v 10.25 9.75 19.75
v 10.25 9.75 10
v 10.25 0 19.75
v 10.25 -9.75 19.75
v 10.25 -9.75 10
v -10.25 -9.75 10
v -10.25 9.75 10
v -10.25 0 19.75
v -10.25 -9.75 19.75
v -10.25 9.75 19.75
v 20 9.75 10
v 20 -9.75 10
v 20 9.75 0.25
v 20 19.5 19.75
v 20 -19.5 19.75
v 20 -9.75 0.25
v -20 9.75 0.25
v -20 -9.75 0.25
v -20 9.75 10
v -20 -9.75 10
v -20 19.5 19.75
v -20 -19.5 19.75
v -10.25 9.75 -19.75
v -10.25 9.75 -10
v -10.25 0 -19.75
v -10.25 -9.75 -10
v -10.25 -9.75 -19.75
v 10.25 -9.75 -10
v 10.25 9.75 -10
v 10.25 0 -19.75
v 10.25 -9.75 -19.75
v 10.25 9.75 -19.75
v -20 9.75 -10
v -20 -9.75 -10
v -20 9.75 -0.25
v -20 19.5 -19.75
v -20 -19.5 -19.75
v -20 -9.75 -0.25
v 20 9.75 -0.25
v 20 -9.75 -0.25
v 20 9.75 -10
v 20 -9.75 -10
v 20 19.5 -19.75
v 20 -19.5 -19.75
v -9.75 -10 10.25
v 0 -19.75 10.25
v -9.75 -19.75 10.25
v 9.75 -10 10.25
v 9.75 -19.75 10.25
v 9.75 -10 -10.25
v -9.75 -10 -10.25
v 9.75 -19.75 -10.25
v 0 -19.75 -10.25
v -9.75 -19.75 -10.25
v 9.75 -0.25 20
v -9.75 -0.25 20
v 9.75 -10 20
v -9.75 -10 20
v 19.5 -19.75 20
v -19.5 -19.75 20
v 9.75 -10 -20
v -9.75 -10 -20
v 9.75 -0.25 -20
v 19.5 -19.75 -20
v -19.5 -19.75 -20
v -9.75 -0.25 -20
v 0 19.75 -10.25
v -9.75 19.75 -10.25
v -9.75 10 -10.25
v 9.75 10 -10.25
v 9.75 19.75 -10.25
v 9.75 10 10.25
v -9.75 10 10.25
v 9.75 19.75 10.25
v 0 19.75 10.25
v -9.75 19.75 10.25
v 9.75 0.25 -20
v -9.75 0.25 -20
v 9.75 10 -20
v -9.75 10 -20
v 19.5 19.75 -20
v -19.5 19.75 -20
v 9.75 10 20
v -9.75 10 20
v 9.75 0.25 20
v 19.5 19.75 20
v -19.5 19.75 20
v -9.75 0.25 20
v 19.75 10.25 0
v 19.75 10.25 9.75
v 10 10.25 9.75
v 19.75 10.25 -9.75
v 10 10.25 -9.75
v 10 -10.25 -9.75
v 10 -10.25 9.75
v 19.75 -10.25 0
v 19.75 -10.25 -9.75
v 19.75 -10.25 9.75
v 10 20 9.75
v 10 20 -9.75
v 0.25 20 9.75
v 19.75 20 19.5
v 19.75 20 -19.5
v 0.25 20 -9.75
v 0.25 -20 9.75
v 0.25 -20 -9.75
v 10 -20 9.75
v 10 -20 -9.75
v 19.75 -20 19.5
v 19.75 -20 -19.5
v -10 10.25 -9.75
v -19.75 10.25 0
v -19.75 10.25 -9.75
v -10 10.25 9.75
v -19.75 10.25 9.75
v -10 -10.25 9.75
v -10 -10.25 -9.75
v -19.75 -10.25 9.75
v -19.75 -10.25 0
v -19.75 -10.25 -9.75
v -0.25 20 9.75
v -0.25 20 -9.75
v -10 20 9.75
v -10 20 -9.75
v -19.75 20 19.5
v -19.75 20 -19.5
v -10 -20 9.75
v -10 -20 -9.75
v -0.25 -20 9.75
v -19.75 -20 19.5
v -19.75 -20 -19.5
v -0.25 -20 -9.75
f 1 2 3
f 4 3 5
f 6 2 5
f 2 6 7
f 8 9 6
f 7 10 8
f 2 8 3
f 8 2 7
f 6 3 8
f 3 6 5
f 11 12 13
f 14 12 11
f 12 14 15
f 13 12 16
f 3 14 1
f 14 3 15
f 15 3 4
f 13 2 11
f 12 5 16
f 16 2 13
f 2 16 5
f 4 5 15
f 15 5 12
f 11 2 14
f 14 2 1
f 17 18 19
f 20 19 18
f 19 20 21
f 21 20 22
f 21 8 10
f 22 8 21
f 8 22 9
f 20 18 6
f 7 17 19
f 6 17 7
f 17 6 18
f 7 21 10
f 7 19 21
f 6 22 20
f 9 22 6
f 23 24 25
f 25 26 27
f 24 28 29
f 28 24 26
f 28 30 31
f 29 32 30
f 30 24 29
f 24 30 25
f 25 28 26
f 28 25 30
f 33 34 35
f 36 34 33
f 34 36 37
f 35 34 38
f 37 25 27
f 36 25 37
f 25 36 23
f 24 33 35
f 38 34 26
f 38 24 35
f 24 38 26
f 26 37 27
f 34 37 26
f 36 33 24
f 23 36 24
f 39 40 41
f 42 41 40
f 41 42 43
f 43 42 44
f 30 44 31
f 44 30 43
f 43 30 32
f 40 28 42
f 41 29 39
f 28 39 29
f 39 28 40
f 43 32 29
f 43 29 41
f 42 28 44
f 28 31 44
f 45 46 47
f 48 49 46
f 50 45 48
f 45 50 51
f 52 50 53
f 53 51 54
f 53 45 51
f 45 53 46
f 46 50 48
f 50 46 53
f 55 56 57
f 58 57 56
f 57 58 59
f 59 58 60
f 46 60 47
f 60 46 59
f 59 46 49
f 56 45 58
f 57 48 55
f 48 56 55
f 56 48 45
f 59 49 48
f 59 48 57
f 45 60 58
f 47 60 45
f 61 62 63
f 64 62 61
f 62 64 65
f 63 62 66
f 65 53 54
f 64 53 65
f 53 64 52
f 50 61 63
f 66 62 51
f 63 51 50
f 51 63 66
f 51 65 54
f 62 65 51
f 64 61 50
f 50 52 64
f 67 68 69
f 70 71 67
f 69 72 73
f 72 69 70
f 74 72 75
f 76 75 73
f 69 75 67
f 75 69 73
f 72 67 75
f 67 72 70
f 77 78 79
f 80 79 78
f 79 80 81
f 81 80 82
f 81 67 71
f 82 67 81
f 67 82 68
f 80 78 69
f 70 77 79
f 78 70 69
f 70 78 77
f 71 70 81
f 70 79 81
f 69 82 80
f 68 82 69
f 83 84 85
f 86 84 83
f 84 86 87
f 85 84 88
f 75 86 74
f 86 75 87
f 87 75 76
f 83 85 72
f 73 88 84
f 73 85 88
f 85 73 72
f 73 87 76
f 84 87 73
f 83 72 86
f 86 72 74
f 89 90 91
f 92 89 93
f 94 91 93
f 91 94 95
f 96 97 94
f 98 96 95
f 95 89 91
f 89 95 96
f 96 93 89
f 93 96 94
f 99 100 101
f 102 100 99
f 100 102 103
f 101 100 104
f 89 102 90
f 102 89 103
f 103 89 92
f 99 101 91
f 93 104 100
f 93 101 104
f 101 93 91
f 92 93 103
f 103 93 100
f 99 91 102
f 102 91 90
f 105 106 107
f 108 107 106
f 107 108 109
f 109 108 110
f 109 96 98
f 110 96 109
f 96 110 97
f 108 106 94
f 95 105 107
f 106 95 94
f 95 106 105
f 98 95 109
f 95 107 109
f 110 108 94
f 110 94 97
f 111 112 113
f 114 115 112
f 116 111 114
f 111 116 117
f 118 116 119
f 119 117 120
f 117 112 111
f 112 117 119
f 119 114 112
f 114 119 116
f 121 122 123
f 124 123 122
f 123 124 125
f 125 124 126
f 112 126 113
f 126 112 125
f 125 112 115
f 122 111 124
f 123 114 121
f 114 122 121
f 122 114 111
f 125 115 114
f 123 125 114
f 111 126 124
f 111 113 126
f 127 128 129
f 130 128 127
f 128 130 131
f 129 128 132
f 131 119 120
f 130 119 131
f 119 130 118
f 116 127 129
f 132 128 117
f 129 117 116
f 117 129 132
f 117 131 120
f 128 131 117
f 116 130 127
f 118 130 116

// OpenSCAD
/////////////////////////////////////////////
// Expanding Box puzzle
// --------------------
//
// This is a coordinate motion puzzle with 6 identical pieces.
// The original idea is from Steward Coffin: https://johnrausch.com/PuzzlingWorld/chap12.htm#p1
// In his words: "it is more of an amusement than a puzzle".
//
//
// Very easy to print (no support, 0.2mm, a = 40 and g = 0.25 works nicely for me).
//
// Designed by David Gontier ( davidgontier@gmail.com )
// 
/////////////////////////////////////////////


a = 40;
g = 0.25; // the gap

//////////////////////////////////////////////
R = a/4;

module prism() { 
    difference() {
        translate([-R-g, -R, 0]) cube([2*R+2*g, 2*R, R]); // main cube
        translate([-R-1, R, -g]) rotate([45, 0, 0]) cube(R*[4,4,4]) ; //first cut
        translate([-R-1, -R, -g]) rotate([45, 0, 0]) cube(R*[4,4,4]) ; //second cut
        
    }
}

module tip() { 
    intersection() {
        cube((R-g)*[1,1,1]);
        rotate([0, 45, 0]) cube(R*[2, 2, 2]);
        rotate([-45,0, 0]) cube(R*[2, 2, 2]);
    }
}

module rhomboid_prism() {
    union() {
        // the main prism
        intersection() {
            translate([0, -R+g, -R]) cube([R-g, 2*R-2*g, 2*R-g]);
            rotate([0, 45, 0]) translate([-2*R, -R, 0]) cube(R*[4, 4, 4]);
        }
        // the tips
        translate([0, -R+g, 0]) rotate([90, 0, 0] ) tip();
        translate([0, R-g, 0]) rotate([0, -90, 0] ) rotate([-90, 0, 0] ) tip();
    }
        
}

module piece() { render() 
    union() {
        prism();
        translate([R+g, 0, 0]) rhomboid_prism();
        rotate([0, 0, 180]) translate([R+g, 0, 0]) rhomboid_prism();
    }
}

// For the STL file
//! translate([0, 0, R]) rotate([180, 0, 0]) piece();


// For the animation
//x = $t;
x = 0;
translate(R*[0, 0, 1+x]) piece(); //yellow
color([0, 0, 1]) translate(R*[0, 0, -1-x]) rotate([0, 180, 0]) piece(); //blue
color([1, 0, 0]) translate(R*[0, -1-x, 0]) rotate([90, 0, 0]) rotate([0, 0, 90]) piece(); //red
color([0, 1, 0]) translate(R*[0, 1+x, 0]) rotate([-90, 0, 0]) rotate([0, 0, 90]) piece(); //green
color([0, 1, 1]) translate(R*[1+x, 0, 0]) rotate([0, 90, 0]) rotate([0, 0, 90]) piece(); //cyan
color([1, 1, 1]) translate(R*[-1-x, 0, 0]) rotate([0, -90, 0]) rotate([0, 0, 90]) piece(); //white
